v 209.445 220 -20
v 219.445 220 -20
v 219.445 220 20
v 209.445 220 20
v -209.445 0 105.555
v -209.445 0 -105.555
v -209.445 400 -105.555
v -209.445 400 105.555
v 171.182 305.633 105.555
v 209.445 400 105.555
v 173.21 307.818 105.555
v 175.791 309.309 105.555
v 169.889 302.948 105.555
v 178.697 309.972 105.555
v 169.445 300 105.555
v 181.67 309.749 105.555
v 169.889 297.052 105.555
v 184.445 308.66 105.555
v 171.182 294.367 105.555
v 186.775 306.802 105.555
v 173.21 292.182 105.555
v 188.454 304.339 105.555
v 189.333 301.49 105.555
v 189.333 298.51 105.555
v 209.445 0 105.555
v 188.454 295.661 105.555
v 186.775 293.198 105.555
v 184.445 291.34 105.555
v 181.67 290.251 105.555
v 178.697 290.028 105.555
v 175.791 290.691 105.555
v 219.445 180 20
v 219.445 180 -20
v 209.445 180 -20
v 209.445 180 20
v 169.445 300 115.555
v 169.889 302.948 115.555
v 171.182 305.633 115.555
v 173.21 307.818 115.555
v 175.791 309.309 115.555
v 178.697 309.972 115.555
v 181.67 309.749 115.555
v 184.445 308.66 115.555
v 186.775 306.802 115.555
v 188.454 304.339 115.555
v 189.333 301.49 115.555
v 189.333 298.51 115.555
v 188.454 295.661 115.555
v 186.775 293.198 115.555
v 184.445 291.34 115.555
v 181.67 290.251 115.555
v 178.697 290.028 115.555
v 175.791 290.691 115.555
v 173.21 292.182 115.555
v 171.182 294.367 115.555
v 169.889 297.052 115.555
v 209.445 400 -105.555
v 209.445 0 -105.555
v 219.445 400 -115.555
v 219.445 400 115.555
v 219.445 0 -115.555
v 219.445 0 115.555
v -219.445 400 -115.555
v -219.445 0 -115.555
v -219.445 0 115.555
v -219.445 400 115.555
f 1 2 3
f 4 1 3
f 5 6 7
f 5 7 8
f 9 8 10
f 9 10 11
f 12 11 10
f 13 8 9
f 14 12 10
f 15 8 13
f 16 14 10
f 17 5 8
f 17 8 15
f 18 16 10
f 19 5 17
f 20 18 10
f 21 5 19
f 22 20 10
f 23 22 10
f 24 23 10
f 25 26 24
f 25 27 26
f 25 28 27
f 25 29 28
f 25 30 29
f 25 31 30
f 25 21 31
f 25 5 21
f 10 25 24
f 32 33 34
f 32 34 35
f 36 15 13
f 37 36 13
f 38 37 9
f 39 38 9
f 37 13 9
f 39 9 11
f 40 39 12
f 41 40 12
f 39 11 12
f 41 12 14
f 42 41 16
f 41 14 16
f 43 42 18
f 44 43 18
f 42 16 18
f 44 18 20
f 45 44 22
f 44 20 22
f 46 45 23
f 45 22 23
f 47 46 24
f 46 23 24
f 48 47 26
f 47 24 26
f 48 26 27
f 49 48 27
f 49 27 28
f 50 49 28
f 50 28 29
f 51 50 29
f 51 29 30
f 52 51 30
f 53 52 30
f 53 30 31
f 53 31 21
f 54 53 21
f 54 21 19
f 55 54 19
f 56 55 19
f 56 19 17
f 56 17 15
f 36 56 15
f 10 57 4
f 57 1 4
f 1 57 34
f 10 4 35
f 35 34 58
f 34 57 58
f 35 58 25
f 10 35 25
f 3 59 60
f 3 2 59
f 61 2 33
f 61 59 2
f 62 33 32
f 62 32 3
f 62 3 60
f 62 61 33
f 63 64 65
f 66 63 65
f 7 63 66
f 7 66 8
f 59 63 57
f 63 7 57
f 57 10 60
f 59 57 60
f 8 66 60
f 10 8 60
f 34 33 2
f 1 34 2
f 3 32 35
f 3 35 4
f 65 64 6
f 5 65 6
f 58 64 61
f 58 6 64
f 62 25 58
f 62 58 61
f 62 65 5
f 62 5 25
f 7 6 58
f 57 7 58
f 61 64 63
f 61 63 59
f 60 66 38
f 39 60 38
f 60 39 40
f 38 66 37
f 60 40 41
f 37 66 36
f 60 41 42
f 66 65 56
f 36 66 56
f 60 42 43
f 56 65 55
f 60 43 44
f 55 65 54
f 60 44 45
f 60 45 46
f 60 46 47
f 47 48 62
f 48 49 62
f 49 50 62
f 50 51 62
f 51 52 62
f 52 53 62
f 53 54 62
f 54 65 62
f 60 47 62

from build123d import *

# Parameters (mm, degrees)
F0_W     = 438.88918
F0_H     = 231.110052
F0_W_2   = 418.88918
F0_H_2   = 211.110052
F1_DEPTH = 400
F3_D     = 20
F3_DEPTH = 12.4
F4_W     = 40
F4_H     = 40
F5_DEPTH = 10


with BuildPart() as f1:
    # F0 (on Front) → F1 (new body)
    with BuildSketch(Plane.XZ):
        Rectangle(F0_W, F0_H)
        Rectangle(F0_W_2, F0_H_2, mode=Mode.SUBTRACT)
    extrude(amount=-F1_DEPTH)

    # F3
    with Locations(Plane.XY.offset(115.555026)):
        with Locations((179.44459, 300)):
            Hole(F3_D / 2, depth=F3_DEPTH)

    # F4 (on face) → F5 (cut, through all)
    with BuildSketch(Plane.YZ.offset(219.44459)):
        with Locations((200, 0)):
            Rectangle(F4_W, F4_H)
    extrude(amount=-F5_DEPTH, mode=Mode.SUBTRACT)


solid = f1.part
